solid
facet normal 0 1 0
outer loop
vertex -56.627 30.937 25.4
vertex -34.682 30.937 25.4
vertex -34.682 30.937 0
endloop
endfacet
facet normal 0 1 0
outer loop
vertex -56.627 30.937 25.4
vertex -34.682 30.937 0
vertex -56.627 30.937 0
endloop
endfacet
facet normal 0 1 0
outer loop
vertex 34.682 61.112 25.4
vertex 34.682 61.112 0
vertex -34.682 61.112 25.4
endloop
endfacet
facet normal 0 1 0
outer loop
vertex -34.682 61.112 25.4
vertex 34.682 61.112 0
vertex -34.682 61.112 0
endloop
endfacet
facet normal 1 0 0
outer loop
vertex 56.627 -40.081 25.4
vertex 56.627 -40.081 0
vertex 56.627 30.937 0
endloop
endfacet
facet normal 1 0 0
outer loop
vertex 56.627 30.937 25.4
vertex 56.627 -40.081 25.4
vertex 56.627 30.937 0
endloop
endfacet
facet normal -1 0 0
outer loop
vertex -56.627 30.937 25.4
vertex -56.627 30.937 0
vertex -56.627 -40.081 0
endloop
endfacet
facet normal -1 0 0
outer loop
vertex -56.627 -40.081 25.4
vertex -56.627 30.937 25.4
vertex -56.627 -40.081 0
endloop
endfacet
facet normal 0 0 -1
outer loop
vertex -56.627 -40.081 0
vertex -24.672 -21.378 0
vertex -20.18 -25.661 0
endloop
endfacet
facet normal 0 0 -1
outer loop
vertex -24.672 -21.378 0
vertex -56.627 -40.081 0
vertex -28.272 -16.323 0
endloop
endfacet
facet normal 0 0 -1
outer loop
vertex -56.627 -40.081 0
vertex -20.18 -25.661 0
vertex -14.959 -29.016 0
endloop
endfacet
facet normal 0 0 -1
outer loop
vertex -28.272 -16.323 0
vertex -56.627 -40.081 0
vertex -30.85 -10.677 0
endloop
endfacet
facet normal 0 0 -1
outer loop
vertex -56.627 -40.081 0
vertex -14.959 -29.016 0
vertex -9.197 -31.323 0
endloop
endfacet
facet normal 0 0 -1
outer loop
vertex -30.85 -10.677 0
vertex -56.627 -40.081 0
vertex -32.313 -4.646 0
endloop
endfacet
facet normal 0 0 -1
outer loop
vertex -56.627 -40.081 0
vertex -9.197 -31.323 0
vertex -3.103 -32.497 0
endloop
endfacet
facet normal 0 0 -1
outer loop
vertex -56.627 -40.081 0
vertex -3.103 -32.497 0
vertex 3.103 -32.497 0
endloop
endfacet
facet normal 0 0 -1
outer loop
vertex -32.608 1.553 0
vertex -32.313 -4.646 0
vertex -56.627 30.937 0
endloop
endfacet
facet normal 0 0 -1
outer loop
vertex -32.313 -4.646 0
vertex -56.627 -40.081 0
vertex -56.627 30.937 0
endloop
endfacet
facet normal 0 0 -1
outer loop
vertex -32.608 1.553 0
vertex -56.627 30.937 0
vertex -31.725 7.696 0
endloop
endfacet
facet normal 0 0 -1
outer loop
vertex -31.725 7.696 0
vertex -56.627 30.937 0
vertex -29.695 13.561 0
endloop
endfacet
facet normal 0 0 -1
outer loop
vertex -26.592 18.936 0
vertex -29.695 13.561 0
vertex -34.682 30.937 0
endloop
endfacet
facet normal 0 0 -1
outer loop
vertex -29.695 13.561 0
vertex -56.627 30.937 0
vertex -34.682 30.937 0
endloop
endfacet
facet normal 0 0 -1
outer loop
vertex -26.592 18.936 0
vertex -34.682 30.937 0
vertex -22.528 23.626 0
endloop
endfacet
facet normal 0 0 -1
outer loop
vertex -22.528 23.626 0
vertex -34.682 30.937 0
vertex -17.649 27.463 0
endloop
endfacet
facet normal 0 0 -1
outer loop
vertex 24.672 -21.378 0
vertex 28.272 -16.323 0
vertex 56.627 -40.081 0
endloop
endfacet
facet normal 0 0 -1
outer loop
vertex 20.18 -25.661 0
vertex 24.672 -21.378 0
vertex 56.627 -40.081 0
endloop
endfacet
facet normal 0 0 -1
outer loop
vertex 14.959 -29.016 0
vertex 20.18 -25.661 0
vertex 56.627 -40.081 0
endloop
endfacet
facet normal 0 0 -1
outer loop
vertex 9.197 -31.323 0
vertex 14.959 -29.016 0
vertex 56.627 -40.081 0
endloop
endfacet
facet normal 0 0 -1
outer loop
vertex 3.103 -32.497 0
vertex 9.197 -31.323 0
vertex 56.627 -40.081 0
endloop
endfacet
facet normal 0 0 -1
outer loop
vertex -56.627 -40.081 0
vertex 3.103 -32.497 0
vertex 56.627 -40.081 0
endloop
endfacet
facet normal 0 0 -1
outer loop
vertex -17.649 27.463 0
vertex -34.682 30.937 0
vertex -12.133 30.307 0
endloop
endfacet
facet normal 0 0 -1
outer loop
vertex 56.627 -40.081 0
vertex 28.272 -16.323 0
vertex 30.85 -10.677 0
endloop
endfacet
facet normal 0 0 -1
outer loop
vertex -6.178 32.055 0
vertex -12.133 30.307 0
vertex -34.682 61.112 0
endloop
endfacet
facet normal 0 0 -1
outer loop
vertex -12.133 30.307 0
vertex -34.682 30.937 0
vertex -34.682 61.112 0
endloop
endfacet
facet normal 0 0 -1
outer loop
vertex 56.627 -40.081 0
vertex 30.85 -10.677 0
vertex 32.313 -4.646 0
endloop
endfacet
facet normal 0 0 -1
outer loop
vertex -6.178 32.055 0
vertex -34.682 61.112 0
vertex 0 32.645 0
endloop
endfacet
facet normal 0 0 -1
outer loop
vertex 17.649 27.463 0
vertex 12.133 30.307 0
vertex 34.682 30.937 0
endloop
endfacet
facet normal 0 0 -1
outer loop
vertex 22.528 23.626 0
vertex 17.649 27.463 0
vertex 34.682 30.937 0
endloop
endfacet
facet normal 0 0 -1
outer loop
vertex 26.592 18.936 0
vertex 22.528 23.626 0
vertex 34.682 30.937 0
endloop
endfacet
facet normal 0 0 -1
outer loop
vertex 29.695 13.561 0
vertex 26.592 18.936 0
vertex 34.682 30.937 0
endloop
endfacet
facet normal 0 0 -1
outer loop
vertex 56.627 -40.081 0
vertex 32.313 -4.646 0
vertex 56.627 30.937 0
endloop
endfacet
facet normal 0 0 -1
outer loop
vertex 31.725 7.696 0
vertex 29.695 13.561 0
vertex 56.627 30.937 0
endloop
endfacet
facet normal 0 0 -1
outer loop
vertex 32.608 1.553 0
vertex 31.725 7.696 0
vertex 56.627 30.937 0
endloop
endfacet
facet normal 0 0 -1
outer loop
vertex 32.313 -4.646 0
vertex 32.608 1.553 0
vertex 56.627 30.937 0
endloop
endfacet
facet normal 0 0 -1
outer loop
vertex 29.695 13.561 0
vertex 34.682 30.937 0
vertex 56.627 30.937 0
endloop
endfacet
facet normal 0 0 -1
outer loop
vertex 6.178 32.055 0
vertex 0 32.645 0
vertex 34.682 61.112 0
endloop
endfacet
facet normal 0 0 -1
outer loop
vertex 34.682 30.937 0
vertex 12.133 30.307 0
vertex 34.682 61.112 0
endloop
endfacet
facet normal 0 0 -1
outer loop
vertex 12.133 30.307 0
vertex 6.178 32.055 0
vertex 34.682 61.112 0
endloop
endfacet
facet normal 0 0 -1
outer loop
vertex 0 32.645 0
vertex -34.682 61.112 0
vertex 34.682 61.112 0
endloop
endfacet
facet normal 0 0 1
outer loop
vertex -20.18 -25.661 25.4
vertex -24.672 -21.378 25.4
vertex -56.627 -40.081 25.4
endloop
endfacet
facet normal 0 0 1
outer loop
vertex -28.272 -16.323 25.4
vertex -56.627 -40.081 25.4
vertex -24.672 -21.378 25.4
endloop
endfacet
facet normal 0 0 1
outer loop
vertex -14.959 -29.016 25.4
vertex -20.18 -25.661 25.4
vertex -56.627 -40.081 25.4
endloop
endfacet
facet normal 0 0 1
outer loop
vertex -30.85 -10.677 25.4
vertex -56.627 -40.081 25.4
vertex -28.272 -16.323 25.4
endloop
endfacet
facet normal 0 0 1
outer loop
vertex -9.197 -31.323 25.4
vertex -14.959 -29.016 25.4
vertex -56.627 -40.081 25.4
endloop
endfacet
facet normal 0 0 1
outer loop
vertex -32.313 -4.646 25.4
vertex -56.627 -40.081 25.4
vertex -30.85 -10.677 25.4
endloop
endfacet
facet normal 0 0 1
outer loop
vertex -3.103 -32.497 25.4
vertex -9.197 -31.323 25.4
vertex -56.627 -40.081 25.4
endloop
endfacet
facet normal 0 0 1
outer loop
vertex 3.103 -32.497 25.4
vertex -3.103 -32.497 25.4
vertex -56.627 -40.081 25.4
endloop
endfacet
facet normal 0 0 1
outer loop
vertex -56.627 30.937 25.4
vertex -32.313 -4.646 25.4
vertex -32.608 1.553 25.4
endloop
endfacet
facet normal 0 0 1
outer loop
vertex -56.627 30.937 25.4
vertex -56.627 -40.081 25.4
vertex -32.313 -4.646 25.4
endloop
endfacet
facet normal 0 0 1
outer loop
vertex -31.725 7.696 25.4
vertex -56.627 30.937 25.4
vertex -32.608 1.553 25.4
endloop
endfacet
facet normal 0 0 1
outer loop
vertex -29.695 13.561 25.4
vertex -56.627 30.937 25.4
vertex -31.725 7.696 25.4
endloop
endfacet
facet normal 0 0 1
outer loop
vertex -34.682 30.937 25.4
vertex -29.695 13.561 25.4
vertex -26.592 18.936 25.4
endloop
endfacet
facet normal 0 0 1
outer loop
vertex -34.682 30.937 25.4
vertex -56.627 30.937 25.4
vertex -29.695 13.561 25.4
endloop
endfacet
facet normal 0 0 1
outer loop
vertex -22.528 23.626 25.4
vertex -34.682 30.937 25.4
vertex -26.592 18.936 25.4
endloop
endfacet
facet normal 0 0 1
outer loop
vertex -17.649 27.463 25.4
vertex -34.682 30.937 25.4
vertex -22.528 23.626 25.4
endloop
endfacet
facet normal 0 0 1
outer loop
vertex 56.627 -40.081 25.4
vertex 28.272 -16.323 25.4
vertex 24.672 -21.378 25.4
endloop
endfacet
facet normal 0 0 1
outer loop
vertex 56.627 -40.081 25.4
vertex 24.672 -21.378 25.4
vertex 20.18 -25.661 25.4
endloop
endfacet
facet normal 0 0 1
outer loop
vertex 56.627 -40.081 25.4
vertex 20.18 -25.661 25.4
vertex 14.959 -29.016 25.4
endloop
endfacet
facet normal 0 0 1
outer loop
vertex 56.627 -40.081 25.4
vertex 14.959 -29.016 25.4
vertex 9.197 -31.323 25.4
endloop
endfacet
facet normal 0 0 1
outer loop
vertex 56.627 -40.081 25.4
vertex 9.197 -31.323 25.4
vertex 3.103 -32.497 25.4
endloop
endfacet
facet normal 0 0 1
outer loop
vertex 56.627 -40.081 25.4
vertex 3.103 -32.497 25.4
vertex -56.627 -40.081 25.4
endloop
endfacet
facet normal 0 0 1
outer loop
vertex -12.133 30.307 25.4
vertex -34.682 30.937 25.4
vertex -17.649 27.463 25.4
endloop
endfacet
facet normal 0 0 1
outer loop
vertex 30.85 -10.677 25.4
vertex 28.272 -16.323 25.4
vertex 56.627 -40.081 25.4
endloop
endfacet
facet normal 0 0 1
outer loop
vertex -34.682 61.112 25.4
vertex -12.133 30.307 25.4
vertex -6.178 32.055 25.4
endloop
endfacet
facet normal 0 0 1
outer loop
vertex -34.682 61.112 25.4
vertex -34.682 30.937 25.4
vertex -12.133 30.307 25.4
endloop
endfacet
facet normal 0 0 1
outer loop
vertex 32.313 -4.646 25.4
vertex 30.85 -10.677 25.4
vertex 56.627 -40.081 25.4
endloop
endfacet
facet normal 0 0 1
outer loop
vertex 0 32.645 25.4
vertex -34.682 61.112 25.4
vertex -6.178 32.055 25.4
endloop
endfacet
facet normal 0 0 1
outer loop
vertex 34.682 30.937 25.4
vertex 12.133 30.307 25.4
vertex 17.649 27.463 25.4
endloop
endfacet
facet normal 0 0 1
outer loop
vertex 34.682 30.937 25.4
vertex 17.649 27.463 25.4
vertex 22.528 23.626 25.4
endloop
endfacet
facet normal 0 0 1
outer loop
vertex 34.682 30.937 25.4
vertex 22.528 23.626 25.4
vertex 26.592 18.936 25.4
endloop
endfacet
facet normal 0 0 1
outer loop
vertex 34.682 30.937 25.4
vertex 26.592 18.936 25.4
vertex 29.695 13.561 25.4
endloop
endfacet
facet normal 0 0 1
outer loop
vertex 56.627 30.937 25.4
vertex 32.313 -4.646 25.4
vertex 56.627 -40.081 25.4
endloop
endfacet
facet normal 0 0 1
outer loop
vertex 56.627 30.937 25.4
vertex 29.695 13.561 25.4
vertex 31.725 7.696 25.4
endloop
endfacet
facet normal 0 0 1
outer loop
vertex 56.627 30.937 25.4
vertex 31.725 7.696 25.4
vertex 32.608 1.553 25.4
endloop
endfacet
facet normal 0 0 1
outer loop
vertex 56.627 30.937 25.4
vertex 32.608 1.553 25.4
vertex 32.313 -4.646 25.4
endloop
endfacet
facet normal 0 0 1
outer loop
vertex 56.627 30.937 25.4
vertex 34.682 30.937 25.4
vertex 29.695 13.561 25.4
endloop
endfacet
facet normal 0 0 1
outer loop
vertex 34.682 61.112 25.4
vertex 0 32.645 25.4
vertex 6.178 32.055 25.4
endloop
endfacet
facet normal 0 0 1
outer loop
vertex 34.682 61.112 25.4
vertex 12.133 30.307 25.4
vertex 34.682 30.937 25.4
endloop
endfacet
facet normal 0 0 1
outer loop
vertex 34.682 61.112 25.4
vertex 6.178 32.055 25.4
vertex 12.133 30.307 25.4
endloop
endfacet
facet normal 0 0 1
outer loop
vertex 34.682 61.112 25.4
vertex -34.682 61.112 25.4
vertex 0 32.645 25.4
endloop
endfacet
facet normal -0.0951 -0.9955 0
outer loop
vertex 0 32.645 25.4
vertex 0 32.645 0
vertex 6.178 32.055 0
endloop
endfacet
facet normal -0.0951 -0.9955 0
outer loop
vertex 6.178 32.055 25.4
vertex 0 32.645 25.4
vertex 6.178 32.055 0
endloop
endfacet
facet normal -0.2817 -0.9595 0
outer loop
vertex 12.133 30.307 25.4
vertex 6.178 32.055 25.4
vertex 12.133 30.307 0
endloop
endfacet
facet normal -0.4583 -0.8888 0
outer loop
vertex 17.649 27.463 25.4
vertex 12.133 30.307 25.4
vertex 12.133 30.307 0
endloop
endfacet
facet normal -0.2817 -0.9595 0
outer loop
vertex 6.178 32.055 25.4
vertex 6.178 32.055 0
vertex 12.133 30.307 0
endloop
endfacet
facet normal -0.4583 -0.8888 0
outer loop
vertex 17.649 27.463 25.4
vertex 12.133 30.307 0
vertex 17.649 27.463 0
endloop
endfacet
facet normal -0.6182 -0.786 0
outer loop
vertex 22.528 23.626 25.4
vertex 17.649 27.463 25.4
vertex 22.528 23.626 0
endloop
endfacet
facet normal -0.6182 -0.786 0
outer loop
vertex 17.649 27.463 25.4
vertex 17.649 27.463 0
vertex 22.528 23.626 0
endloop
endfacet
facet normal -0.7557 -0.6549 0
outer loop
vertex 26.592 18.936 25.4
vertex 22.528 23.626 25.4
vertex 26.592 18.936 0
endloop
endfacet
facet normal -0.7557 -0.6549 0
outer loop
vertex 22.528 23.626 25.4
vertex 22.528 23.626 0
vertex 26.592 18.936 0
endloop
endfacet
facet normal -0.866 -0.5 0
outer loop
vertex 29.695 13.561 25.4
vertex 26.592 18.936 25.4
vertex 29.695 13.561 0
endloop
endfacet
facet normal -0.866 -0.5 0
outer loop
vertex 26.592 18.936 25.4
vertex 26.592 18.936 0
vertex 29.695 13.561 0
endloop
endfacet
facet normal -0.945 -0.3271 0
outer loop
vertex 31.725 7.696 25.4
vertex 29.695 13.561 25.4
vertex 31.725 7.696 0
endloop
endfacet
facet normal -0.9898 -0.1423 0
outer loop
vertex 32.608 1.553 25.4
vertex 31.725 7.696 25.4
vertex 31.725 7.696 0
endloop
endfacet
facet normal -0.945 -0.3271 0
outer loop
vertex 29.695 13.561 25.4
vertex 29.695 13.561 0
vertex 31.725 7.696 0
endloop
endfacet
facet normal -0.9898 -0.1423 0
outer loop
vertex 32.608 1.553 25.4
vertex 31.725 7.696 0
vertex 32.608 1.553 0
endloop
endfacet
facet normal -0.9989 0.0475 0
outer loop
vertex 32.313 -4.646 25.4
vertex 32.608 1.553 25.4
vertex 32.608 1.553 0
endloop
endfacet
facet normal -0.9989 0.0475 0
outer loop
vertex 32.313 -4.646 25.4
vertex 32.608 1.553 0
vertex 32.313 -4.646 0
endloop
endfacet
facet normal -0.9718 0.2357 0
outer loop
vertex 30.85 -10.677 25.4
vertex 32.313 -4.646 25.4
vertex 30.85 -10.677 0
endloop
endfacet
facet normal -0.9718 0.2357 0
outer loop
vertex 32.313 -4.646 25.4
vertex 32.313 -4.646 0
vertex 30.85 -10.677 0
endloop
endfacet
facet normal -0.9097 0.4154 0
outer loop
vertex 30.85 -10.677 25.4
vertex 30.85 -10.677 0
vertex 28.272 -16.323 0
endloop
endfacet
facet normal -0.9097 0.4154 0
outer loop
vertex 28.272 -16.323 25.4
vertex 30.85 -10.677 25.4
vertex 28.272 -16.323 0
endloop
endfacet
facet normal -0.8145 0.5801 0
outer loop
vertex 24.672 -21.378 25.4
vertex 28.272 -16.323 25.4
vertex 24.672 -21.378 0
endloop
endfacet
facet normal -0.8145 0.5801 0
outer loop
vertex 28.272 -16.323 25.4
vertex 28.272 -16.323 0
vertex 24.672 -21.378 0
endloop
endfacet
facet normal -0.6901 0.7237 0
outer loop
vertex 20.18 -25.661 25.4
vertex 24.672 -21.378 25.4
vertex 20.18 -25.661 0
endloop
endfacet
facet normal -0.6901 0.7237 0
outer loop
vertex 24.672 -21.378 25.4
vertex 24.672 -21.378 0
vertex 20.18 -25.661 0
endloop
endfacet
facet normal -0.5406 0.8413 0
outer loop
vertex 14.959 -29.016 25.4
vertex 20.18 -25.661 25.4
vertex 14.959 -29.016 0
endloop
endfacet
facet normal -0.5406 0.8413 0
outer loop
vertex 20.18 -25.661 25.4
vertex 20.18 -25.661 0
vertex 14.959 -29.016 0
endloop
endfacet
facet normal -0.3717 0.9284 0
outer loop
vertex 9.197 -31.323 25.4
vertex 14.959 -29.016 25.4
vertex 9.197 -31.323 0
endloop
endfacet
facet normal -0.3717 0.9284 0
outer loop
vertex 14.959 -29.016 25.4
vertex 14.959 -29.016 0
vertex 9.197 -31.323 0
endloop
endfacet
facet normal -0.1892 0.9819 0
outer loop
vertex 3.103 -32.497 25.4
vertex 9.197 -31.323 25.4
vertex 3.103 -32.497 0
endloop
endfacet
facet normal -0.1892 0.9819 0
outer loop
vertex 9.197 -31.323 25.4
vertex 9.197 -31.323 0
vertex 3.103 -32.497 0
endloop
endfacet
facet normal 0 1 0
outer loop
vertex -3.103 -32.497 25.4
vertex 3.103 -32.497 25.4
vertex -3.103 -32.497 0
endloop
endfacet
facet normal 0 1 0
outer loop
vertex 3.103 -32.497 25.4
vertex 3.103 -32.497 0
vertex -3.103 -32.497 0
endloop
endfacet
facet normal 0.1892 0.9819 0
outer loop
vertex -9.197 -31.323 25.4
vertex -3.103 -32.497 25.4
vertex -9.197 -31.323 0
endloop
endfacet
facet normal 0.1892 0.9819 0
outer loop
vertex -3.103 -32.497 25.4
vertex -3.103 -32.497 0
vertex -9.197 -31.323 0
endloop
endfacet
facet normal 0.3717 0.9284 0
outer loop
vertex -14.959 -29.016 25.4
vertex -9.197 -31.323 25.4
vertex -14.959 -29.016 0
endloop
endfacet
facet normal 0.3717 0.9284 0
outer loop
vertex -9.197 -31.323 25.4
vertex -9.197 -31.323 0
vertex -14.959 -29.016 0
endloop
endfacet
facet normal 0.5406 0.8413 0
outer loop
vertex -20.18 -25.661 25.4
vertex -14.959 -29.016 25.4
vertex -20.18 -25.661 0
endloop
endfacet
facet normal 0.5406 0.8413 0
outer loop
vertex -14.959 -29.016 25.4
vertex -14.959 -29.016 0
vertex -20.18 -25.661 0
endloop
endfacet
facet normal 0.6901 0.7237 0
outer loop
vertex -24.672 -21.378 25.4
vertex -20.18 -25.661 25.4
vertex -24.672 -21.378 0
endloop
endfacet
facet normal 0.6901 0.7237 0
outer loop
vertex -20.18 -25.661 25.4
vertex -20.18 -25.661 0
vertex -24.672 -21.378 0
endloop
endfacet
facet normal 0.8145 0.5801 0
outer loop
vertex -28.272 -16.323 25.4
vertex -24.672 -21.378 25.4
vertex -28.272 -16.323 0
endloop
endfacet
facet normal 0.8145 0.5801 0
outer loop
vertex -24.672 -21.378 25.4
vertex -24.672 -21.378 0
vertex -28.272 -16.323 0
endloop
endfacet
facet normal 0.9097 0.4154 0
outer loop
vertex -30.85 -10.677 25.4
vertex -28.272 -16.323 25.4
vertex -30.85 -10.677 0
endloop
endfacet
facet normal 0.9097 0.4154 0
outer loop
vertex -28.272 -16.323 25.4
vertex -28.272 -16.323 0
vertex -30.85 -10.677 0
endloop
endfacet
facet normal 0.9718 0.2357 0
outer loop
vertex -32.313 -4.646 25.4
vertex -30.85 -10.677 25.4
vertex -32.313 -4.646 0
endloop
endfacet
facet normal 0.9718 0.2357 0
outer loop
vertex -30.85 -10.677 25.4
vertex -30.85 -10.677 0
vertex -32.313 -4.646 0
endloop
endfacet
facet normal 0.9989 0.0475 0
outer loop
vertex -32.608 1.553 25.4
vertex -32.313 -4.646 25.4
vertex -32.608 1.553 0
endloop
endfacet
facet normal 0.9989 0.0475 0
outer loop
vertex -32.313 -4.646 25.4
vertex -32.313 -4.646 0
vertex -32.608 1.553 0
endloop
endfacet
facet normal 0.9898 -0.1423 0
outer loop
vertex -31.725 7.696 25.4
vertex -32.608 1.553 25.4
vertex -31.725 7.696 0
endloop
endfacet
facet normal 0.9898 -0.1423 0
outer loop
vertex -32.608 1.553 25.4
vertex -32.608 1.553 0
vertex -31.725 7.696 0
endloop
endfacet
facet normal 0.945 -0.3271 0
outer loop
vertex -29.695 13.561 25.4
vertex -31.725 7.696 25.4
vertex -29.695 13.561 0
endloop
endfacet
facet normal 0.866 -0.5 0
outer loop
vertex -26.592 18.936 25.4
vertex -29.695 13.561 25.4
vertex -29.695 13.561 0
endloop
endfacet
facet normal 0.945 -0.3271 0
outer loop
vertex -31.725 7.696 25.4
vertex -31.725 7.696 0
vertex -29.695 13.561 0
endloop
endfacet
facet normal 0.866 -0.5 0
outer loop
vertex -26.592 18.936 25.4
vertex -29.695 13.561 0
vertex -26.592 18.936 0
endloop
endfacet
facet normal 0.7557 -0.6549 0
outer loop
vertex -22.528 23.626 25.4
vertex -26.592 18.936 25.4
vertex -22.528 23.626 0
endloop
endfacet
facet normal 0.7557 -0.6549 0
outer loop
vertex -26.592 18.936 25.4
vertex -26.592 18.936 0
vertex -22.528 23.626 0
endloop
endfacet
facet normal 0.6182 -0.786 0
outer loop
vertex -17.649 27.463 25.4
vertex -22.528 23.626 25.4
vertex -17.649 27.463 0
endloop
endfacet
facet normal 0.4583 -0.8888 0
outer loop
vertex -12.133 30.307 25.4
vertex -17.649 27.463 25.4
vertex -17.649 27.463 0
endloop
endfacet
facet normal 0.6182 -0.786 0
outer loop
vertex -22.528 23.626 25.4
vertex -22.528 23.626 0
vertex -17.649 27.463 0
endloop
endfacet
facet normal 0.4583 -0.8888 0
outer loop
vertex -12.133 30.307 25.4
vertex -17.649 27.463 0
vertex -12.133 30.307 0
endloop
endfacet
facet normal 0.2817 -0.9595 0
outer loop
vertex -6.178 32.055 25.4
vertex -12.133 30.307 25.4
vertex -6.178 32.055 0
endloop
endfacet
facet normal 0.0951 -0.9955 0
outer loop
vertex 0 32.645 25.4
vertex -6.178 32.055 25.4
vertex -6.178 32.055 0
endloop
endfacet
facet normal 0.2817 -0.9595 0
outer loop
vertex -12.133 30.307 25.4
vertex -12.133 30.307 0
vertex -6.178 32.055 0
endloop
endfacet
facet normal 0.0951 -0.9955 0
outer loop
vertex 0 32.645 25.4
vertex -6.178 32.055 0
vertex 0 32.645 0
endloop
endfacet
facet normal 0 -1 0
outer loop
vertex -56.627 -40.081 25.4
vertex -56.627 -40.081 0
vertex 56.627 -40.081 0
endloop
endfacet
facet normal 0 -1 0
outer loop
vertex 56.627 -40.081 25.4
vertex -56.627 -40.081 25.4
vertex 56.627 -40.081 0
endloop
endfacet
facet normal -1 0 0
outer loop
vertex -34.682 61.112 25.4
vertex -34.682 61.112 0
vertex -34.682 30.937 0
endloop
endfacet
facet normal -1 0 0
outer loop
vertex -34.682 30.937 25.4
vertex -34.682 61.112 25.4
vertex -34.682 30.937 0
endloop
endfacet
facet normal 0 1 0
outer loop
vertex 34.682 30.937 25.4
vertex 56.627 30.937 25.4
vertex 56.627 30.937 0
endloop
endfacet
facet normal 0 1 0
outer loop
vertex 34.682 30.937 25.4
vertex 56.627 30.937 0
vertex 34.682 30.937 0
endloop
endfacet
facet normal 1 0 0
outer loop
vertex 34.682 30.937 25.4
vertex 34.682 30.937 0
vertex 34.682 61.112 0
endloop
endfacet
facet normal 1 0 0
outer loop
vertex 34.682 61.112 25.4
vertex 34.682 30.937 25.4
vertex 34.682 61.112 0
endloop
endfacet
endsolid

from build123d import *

# Parameters (mm, degrees)
F1_DEPTH = 25.4
F2_DEPTH = 25.4


with BuildPart() as f1:
    # F0 (on Top) → F1 (new body)
    with BuildSketch(Plane.XY):
        Polygon((-34.6818976104, 30.9372004122), (-56.627497077, 30.9372004122), (-56.627497077, -40.0811992586), (0, -40.0811992586), (56.627497077, -40.0811992586), (56.627497077, 30.9372004122), (34.6818976104, 30.9372004122), (34.6818976104, 61.1124001443), (0, 61.1124001443), (-34.6818976104, 61.1124001443), align=None)
        with BuildLine():
            ThreePointArc((0, -32.6451188582), (-32.6451188582, 0), (0, 32.6451188582))
            ThreePointArc((0, 32.6451188582), (32.6451188582, 0), (0, -32.6451188582))
        make_face(mode=Mode.SUBTRACT)
    extrude(amount=F1_DEPTH)

    # F0 (on Top) → F2 (join)
    with BuildSketch(Plane.XY):
        Polygon((-34.6818976104, 30.9372004122), (-56.627497077, 30.9372004122), (-56.627497077, -40.0811992586), (0, -40.0811992586), (56.627497077, -40.0811992586), (56.627497077, 30.9372004122), (34.6818976104, 30.9372004122), (34.6818976104, 61.1124001443), (0, 61.1124001443), (-34.6818976104, 61.1124001443), align=None)
        with BuildLine():
            ThreePointArc((0, -32.6451188582), (-32.6451188582, 0), (0, 32.6451188582))
            ThreePointArc((0, 32.6451188582), (32.6451188582, 0), (0, -32.6451188582))
        make_face(mode=Mode.SUBTRACT)
    extrude(amount=F2_DEPTH)


solid = f1.part
